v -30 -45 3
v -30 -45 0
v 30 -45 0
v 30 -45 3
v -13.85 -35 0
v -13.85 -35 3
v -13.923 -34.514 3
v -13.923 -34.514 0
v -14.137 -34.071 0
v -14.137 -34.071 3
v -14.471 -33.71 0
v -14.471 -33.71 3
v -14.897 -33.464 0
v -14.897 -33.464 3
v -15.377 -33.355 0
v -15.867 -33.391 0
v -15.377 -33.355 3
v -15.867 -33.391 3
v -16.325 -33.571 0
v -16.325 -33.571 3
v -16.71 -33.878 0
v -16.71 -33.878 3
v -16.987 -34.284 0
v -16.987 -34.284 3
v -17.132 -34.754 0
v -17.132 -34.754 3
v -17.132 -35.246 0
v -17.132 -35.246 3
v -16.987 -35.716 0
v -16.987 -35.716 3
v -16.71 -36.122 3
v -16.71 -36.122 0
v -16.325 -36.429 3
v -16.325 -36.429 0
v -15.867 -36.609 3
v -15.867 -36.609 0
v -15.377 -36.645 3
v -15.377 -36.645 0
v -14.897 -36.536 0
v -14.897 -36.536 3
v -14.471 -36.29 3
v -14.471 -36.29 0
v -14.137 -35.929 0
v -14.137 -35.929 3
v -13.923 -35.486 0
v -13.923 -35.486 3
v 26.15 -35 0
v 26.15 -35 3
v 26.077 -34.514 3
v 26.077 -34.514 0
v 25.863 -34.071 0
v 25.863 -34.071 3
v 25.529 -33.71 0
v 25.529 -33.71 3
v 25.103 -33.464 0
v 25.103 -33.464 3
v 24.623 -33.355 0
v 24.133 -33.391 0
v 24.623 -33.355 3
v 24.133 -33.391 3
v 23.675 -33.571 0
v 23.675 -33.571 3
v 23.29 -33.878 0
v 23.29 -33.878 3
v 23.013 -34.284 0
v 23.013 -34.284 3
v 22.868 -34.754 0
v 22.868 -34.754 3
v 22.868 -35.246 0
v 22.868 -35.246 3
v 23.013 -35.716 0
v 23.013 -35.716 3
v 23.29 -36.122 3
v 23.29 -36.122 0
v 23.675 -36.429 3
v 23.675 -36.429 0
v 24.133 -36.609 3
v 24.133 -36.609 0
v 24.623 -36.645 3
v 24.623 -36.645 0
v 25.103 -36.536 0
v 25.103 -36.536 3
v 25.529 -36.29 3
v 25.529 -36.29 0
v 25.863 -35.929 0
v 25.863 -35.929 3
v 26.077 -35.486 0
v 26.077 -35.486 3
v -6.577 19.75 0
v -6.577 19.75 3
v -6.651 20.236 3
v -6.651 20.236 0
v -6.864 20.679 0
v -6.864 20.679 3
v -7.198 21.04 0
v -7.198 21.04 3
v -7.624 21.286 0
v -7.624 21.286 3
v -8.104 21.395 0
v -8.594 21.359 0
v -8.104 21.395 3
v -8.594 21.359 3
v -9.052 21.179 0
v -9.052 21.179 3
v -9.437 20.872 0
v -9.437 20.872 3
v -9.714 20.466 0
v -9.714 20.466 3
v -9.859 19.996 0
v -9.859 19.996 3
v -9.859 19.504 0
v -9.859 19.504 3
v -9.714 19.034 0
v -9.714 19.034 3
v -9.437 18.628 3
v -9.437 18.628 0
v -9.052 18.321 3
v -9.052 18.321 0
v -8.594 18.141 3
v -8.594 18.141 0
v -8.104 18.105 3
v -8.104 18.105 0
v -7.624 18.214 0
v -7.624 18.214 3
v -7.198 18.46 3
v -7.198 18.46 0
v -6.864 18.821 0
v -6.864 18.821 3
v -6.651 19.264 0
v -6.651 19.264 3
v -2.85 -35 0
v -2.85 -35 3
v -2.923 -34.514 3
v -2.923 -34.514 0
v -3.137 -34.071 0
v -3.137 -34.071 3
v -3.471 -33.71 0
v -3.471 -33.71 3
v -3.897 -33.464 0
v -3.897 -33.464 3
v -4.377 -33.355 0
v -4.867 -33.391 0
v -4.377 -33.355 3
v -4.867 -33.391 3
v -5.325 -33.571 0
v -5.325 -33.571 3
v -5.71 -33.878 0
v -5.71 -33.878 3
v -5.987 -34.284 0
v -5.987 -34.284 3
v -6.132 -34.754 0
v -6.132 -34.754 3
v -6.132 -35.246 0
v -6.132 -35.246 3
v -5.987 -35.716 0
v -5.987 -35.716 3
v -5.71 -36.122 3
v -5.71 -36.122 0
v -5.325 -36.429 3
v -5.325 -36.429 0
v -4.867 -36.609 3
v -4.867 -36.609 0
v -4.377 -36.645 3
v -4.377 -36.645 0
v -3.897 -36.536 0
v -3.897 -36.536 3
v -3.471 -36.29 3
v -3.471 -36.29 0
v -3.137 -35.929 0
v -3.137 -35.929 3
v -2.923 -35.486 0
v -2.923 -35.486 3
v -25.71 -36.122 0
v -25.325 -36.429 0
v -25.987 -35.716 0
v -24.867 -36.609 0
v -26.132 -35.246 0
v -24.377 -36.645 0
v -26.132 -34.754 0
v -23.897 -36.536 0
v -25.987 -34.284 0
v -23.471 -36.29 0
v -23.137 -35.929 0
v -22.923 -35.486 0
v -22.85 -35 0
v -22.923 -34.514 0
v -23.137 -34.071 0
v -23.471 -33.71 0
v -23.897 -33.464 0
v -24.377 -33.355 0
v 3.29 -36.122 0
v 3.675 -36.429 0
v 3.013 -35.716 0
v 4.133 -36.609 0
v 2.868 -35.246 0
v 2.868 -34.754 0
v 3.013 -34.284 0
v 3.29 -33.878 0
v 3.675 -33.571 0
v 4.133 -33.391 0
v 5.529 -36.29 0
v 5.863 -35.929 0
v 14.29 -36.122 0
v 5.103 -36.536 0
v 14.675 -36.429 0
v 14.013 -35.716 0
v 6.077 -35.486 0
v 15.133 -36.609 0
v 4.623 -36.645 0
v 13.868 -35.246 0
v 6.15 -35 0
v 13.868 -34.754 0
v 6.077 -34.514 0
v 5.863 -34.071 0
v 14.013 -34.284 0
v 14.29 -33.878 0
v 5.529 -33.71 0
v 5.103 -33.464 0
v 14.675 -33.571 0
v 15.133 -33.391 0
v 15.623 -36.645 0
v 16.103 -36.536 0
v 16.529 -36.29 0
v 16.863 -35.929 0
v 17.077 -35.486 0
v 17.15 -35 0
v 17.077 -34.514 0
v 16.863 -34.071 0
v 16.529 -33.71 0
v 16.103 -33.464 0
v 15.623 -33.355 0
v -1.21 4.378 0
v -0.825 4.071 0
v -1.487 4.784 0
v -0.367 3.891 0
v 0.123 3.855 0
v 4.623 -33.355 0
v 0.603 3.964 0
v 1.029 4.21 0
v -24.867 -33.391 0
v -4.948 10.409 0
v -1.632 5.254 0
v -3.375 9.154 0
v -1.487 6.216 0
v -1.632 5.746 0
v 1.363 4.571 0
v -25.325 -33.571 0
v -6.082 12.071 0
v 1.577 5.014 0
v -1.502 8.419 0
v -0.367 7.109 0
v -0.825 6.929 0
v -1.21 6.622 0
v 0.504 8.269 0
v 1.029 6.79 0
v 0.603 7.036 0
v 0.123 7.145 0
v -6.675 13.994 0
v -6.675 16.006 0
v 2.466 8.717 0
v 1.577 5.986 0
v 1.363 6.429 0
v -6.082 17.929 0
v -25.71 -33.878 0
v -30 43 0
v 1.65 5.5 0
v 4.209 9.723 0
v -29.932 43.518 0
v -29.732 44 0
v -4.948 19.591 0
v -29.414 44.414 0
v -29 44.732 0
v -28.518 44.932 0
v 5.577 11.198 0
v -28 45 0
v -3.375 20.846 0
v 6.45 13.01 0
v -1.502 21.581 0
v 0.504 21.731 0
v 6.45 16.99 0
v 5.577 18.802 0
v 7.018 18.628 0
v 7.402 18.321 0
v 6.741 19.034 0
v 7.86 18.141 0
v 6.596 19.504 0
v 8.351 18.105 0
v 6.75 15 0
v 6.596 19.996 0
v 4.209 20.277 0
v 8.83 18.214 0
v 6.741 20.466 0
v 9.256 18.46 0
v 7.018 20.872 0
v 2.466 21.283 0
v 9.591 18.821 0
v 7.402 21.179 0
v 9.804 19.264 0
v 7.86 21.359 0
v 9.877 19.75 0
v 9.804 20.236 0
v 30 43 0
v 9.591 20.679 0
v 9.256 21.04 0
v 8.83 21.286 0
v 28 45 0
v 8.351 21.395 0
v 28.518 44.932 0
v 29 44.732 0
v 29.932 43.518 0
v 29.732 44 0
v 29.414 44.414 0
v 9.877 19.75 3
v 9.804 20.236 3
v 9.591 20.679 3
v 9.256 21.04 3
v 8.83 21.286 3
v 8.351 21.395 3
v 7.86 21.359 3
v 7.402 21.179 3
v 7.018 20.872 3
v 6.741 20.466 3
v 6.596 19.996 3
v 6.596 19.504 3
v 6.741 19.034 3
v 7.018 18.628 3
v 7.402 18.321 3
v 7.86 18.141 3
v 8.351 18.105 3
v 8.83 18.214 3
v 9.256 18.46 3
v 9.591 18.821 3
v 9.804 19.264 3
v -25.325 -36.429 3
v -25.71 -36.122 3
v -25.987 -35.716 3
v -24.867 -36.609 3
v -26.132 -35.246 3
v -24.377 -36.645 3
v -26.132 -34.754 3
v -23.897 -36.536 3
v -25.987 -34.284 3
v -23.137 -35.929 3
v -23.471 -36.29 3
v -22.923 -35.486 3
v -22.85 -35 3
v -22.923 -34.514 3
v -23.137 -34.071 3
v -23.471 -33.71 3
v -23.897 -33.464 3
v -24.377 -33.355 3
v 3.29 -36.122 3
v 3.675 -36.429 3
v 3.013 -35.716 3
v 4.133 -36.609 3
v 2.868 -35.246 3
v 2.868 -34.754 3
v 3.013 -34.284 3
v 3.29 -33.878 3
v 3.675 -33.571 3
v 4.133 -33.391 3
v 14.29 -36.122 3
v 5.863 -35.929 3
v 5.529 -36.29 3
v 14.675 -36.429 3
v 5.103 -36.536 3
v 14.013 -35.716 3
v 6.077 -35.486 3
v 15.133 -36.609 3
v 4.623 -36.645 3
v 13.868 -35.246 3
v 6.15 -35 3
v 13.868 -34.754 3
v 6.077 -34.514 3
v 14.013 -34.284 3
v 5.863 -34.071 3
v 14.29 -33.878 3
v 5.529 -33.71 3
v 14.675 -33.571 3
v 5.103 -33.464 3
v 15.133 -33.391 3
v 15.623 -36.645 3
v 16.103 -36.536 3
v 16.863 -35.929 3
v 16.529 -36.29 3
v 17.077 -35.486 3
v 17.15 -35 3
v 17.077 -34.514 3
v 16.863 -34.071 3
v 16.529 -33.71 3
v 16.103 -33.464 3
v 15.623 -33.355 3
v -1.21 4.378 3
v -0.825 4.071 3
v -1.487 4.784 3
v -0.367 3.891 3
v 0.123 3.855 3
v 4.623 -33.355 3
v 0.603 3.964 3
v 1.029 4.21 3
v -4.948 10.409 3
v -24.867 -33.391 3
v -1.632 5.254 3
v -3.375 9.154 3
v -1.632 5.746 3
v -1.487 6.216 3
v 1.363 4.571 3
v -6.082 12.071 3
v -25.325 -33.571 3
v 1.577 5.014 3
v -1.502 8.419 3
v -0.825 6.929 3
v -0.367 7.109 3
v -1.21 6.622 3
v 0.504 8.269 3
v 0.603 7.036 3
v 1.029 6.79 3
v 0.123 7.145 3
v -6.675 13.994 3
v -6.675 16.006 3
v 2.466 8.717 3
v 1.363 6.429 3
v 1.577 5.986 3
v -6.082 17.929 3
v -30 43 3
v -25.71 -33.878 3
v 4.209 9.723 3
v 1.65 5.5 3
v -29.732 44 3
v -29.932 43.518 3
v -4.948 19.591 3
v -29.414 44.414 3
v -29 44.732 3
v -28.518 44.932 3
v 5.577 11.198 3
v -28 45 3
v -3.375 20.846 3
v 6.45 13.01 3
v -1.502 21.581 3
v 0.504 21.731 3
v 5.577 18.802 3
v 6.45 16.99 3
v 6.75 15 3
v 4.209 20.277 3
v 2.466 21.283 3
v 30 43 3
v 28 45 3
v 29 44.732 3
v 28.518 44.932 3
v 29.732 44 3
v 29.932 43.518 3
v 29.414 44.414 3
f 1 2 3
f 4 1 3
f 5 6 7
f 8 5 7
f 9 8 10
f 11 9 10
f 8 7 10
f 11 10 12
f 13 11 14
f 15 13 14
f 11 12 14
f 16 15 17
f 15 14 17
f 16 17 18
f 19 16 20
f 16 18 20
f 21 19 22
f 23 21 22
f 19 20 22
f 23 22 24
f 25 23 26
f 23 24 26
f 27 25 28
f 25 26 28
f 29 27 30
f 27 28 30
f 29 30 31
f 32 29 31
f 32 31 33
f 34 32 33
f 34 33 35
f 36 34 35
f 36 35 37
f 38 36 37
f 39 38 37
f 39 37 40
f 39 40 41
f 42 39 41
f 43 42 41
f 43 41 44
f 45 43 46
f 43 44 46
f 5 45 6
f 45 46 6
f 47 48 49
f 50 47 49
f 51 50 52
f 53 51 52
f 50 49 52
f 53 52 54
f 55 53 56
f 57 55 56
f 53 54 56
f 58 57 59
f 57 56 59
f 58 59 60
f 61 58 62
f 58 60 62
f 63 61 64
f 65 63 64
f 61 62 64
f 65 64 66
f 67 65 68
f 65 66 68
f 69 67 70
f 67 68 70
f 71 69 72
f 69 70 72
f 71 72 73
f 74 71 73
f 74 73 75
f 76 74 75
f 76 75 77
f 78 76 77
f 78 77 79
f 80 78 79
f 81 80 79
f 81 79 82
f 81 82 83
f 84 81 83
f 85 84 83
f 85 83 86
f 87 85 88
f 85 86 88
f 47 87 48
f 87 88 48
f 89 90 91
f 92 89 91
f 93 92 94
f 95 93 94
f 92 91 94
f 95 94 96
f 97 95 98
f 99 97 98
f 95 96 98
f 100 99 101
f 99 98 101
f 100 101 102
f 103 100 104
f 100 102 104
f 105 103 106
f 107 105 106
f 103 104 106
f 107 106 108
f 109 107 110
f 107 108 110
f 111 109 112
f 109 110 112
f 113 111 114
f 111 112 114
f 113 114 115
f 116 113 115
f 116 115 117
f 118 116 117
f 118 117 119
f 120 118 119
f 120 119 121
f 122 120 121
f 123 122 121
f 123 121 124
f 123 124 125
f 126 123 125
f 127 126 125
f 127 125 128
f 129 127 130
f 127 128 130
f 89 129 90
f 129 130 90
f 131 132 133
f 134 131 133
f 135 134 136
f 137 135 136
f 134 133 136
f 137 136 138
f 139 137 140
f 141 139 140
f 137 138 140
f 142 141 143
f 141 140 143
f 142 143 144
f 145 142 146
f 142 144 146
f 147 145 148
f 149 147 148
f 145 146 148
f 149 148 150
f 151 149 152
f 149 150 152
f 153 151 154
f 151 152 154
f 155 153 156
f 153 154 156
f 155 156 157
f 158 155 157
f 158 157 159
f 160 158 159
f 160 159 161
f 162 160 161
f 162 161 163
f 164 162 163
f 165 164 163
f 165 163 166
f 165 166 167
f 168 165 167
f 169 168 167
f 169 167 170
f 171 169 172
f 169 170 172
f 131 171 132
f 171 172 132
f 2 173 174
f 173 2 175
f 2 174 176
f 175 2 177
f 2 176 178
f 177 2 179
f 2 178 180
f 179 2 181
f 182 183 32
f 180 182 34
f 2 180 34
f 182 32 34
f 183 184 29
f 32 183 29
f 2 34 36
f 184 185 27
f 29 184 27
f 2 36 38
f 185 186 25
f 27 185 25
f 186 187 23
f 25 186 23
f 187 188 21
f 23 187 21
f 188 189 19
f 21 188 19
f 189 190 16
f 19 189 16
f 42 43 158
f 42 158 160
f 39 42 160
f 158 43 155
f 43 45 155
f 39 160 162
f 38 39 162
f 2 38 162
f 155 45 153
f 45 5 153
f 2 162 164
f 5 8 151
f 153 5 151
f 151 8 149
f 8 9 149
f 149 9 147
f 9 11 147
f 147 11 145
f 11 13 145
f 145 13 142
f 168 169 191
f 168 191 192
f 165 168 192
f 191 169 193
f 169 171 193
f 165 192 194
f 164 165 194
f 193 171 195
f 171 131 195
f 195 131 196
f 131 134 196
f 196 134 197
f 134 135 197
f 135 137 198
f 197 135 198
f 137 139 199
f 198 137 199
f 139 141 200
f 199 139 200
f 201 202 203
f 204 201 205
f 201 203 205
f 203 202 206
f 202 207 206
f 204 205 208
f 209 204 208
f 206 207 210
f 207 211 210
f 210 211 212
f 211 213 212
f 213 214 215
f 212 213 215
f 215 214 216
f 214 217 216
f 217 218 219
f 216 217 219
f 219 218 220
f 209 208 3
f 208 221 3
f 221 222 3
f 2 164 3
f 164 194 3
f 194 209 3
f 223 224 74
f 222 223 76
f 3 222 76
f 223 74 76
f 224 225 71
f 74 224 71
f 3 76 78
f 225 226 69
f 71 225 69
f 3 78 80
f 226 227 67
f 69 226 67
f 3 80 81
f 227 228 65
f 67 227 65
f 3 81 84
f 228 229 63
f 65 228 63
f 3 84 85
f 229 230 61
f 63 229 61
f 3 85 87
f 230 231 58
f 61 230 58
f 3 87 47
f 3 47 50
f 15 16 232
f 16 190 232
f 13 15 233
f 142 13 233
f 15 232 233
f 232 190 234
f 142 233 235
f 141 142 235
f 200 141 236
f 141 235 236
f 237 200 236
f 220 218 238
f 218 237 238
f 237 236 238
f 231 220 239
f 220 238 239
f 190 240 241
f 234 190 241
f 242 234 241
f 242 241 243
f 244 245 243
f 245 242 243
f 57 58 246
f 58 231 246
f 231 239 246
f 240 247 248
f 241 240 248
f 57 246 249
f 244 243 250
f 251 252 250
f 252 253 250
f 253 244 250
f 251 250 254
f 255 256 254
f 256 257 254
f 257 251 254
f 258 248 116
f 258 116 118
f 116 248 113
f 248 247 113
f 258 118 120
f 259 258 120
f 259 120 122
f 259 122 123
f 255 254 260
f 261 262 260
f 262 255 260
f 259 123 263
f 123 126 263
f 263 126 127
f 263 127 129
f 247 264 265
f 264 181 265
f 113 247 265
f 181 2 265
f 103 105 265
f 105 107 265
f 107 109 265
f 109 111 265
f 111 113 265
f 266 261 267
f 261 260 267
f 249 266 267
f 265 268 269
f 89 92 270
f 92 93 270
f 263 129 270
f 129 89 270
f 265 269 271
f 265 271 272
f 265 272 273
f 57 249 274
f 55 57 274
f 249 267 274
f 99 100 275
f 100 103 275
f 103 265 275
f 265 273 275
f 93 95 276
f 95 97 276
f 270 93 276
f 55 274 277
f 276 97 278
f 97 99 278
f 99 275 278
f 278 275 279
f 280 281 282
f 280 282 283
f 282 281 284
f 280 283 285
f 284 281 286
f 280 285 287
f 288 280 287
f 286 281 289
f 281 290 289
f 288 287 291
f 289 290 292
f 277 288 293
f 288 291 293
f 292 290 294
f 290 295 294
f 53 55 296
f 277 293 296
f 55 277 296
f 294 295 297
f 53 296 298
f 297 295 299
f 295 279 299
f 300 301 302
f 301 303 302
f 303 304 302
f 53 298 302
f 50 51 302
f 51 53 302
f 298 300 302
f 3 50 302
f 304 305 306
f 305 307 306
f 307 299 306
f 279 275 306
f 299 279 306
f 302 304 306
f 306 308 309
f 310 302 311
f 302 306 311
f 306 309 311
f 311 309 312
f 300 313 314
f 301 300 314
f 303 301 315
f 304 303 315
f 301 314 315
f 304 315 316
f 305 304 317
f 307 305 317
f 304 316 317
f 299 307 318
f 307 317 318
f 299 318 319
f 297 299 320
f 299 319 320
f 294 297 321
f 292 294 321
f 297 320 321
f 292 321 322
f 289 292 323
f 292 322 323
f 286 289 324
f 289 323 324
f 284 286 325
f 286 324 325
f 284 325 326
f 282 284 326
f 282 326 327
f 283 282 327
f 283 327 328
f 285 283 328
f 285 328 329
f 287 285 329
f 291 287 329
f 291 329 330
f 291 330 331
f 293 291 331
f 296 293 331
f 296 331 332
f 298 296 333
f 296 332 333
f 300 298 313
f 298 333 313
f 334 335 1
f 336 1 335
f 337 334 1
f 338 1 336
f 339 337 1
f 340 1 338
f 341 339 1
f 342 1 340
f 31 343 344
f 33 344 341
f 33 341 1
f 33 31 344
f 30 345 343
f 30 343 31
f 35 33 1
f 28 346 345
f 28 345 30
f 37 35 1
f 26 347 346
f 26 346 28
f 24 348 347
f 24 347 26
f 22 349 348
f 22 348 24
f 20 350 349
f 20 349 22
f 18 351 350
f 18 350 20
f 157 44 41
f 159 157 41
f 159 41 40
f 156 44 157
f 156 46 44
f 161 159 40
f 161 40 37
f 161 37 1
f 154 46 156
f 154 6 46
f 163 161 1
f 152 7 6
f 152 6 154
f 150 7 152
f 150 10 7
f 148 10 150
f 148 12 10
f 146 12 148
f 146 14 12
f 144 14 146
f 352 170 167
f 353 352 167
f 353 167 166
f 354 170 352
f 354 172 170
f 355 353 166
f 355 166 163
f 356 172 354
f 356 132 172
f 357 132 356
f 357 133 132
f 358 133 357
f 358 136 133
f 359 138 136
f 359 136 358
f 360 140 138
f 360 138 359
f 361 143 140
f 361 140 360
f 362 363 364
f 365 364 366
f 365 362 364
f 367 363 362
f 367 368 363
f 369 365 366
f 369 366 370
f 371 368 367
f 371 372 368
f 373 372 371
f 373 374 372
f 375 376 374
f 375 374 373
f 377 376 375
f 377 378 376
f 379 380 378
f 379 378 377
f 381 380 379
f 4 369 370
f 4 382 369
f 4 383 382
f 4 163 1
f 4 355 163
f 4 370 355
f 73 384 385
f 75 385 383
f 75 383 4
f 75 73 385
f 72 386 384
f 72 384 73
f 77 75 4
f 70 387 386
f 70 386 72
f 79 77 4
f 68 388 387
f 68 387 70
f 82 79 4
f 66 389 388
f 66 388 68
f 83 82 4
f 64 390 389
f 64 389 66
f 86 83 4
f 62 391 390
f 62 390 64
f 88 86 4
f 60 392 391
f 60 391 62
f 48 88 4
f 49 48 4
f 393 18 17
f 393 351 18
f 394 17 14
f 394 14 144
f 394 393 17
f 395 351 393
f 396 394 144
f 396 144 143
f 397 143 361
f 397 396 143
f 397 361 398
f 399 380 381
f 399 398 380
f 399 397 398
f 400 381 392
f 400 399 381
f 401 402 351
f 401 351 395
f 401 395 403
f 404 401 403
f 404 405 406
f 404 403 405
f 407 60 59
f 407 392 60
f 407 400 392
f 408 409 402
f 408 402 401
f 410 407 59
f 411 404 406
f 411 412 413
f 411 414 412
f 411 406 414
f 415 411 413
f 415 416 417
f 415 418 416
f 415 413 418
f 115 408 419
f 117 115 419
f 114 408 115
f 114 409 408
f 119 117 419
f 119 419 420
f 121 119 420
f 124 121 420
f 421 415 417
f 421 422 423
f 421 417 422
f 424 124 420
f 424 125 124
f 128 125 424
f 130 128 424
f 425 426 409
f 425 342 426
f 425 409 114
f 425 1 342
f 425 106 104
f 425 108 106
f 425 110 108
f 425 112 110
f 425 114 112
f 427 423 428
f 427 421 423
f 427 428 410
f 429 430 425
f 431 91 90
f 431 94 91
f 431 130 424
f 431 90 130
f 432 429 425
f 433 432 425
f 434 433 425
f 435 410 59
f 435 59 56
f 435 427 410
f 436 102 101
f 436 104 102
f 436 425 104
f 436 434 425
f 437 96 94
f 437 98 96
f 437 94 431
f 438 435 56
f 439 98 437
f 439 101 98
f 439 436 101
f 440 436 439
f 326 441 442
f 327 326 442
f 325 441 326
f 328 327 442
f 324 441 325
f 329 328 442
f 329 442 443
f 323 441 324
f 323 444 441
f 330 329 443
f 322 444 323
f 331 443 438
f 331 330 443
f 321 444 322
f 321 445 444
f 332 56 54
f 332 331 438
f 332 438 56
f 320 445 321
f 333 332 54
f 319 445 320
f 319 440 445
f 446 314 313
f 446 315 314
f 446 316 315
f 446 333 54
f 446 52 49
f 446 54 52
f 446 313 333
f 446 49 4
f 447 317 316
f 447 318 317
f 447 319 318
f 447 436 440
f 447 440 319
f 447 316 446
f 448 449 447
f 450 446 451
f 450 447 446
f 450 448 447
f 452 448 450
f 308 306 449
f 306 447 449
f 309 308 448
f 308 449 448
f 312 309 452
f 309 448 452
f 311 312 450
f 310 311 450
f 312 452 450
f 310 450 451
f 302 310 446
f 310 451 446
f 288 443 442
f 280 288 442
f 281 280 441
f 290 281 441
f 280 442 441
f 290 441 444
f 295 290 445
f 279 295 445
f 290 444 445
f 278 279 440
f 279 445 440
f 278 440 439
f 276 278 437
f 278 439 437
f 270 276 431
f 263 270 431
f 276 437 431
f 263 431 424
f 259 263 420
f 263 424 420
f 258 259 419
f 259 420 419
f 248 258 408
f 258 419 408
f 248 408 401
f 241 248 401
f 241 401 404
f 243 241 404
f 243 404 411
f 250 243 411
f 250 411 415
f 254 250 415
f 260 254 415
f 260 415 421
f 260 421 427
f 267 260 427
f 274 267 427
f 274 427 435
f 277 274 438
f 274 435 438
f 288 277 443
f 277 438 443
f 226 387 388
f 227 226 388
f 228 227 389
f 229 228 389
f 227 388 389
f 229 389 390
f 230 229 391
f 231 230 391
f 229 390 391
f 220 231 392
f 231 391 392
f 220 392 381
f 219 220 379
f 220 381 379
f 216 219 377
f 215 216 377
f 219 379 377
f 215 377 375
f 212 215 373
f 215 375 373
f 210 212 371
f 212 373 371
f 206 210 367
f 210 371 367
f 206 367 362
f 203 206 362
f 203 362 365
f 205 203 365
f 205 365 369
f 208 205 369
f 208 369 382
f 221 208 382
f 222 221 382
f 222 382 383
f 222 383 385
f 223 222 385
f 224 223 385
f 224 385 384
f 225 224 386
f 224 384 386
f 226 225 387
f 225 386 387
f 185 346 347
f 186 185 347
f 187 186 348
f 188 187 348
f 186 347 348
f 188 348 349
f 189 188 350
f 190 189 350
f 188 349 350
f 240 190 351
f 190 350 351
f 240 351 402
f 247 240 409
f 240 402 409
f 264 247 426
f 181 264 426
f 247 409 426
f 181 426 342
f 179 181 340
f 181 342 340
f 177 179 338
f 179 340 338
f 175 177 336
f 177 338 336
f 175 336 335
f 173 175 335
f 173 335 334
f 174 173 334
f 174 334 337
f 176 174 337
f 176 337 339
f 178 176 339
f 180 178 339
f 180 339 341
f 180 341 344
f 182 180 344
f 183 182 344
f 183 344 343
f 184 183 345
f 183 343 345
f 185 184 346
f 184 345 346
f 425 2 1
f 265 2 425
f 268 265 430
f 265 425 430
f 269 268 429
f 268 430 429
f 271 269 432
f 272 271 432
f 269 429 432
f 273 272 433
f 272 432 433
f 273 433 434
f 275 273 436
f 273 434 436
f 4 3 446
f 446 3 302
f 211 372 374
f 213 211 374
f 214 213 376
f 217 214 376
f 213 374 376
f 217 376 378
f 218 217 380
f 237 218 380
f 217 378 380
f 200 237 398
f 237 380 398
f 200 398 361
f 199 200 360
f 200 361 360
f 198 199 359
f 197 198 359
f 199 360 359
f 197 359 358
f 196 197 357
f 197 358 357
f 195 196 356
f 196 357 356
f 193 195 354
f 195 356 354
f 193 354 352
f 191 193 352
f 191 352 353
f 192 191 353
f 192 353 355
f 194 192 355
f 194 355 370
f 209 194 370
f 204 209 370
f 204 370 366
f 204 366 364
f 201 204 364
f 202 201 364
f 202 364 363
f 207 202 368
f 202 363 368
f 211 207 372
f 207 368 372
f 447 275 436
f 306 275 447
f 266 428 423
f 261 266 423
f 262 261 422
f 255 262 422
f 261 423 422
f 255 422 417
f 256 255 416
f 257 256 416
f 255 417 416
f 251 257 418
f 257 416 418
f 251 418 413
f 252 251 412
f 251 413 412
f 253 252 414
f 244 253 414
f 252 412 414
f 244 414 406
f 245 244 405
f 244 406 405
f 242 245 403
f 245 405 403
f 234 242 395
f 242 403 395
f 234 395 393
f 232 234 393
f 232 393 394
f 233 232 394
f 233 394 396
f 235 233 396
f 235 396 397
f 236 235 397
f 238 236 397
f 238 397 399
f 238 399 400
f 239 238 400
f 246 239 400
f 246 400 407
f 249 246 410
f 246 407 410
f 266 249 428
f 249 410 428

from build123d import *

# Parameters (mm, degrees)
SKETCH_1_W          = 60
SKETCH_1_H          = 90
EXTRUDE_1_DEPTH     = 3
SKETCH_2_R          = 1.65
CUT_EXTRUDE_1_DEPTH = 3
SKETCH_3_R          = 1.65
CUT_EXTRUDE_2_DEPTH = 3
SKETCH_4_R          = 6.75
CUT_EXTRUDE_3_DEPTH = 3
FILLET_1_R          = 2


with BuildPart() as part:
    # 草图1 → 凸台-拉伸1 (new body)
    with BuildSketch(Plane.XY):
        Rectangle(SKETCH_1_W, SKETCH_1_H)
    extrude(amount=EXTRUDE_1_DEPTH)

    # 草图2 → 切除-拉伸1 (cut)
    with BuildSketch(Plane.XY.offset(3)):
        with Locations((0, 5.5)):
            Circle(SKETCH_2_R)
        with Locations((-8.227241336, 19.75)):
            Circle(SKETCH_2_R)
        with Locations((8.227241336, 19.75)):
            Circle(SKETCH_2_R)
    extrude(amount=-CUT_EXTRUDE_1_DEPTH, mode=Mode.SUBTRACT)

    # 草图3 → 切除-拉伸2 (cut)
    with BuildSketch(Plane.XY.offset(3)):
        with Locations((4.5, -35)):
            Circle(SKETCH_3_R)
        with Locations((-4.5, -35)):
            Circle(SKETCH_3_R)
        with Locations((24.5, -35)):
            Circle(SKETCH_3_R)
        with Locations((15.5, -35)):
            Circle(SKETCH_3_R)
        with Locations((-24.5, -35)):
            Circle(SKETCH_3_R)
        with Locations((-15.5, -35)):
            Circle(SKETCH_3_R)
    extrude(amount=-CUT_EXTRUDE_2_DEPTH, mode=Mode.SUBTRACT)

    # 草图4 → 切除-拉伸3 (cut)
    with BuildSketch(Plane.XY.offset(3)):
        with Locations((0, 15)):
            Circle(SKETCH_4_R)
    extrude(amount=-CUT_EXTRUDE_3_DEPTH, mode=Mode.SUBTRACT)

    # 圆角1
    fillet_1_edges = [part.edges().sort_by_distance(p)[0] for p in [
        (-30, 45, 1.5),
        (30, 45, 1.5),
    ]]
    fillet(fillet_1_edges, radius=FILLET_1_R)


solid = part.part
